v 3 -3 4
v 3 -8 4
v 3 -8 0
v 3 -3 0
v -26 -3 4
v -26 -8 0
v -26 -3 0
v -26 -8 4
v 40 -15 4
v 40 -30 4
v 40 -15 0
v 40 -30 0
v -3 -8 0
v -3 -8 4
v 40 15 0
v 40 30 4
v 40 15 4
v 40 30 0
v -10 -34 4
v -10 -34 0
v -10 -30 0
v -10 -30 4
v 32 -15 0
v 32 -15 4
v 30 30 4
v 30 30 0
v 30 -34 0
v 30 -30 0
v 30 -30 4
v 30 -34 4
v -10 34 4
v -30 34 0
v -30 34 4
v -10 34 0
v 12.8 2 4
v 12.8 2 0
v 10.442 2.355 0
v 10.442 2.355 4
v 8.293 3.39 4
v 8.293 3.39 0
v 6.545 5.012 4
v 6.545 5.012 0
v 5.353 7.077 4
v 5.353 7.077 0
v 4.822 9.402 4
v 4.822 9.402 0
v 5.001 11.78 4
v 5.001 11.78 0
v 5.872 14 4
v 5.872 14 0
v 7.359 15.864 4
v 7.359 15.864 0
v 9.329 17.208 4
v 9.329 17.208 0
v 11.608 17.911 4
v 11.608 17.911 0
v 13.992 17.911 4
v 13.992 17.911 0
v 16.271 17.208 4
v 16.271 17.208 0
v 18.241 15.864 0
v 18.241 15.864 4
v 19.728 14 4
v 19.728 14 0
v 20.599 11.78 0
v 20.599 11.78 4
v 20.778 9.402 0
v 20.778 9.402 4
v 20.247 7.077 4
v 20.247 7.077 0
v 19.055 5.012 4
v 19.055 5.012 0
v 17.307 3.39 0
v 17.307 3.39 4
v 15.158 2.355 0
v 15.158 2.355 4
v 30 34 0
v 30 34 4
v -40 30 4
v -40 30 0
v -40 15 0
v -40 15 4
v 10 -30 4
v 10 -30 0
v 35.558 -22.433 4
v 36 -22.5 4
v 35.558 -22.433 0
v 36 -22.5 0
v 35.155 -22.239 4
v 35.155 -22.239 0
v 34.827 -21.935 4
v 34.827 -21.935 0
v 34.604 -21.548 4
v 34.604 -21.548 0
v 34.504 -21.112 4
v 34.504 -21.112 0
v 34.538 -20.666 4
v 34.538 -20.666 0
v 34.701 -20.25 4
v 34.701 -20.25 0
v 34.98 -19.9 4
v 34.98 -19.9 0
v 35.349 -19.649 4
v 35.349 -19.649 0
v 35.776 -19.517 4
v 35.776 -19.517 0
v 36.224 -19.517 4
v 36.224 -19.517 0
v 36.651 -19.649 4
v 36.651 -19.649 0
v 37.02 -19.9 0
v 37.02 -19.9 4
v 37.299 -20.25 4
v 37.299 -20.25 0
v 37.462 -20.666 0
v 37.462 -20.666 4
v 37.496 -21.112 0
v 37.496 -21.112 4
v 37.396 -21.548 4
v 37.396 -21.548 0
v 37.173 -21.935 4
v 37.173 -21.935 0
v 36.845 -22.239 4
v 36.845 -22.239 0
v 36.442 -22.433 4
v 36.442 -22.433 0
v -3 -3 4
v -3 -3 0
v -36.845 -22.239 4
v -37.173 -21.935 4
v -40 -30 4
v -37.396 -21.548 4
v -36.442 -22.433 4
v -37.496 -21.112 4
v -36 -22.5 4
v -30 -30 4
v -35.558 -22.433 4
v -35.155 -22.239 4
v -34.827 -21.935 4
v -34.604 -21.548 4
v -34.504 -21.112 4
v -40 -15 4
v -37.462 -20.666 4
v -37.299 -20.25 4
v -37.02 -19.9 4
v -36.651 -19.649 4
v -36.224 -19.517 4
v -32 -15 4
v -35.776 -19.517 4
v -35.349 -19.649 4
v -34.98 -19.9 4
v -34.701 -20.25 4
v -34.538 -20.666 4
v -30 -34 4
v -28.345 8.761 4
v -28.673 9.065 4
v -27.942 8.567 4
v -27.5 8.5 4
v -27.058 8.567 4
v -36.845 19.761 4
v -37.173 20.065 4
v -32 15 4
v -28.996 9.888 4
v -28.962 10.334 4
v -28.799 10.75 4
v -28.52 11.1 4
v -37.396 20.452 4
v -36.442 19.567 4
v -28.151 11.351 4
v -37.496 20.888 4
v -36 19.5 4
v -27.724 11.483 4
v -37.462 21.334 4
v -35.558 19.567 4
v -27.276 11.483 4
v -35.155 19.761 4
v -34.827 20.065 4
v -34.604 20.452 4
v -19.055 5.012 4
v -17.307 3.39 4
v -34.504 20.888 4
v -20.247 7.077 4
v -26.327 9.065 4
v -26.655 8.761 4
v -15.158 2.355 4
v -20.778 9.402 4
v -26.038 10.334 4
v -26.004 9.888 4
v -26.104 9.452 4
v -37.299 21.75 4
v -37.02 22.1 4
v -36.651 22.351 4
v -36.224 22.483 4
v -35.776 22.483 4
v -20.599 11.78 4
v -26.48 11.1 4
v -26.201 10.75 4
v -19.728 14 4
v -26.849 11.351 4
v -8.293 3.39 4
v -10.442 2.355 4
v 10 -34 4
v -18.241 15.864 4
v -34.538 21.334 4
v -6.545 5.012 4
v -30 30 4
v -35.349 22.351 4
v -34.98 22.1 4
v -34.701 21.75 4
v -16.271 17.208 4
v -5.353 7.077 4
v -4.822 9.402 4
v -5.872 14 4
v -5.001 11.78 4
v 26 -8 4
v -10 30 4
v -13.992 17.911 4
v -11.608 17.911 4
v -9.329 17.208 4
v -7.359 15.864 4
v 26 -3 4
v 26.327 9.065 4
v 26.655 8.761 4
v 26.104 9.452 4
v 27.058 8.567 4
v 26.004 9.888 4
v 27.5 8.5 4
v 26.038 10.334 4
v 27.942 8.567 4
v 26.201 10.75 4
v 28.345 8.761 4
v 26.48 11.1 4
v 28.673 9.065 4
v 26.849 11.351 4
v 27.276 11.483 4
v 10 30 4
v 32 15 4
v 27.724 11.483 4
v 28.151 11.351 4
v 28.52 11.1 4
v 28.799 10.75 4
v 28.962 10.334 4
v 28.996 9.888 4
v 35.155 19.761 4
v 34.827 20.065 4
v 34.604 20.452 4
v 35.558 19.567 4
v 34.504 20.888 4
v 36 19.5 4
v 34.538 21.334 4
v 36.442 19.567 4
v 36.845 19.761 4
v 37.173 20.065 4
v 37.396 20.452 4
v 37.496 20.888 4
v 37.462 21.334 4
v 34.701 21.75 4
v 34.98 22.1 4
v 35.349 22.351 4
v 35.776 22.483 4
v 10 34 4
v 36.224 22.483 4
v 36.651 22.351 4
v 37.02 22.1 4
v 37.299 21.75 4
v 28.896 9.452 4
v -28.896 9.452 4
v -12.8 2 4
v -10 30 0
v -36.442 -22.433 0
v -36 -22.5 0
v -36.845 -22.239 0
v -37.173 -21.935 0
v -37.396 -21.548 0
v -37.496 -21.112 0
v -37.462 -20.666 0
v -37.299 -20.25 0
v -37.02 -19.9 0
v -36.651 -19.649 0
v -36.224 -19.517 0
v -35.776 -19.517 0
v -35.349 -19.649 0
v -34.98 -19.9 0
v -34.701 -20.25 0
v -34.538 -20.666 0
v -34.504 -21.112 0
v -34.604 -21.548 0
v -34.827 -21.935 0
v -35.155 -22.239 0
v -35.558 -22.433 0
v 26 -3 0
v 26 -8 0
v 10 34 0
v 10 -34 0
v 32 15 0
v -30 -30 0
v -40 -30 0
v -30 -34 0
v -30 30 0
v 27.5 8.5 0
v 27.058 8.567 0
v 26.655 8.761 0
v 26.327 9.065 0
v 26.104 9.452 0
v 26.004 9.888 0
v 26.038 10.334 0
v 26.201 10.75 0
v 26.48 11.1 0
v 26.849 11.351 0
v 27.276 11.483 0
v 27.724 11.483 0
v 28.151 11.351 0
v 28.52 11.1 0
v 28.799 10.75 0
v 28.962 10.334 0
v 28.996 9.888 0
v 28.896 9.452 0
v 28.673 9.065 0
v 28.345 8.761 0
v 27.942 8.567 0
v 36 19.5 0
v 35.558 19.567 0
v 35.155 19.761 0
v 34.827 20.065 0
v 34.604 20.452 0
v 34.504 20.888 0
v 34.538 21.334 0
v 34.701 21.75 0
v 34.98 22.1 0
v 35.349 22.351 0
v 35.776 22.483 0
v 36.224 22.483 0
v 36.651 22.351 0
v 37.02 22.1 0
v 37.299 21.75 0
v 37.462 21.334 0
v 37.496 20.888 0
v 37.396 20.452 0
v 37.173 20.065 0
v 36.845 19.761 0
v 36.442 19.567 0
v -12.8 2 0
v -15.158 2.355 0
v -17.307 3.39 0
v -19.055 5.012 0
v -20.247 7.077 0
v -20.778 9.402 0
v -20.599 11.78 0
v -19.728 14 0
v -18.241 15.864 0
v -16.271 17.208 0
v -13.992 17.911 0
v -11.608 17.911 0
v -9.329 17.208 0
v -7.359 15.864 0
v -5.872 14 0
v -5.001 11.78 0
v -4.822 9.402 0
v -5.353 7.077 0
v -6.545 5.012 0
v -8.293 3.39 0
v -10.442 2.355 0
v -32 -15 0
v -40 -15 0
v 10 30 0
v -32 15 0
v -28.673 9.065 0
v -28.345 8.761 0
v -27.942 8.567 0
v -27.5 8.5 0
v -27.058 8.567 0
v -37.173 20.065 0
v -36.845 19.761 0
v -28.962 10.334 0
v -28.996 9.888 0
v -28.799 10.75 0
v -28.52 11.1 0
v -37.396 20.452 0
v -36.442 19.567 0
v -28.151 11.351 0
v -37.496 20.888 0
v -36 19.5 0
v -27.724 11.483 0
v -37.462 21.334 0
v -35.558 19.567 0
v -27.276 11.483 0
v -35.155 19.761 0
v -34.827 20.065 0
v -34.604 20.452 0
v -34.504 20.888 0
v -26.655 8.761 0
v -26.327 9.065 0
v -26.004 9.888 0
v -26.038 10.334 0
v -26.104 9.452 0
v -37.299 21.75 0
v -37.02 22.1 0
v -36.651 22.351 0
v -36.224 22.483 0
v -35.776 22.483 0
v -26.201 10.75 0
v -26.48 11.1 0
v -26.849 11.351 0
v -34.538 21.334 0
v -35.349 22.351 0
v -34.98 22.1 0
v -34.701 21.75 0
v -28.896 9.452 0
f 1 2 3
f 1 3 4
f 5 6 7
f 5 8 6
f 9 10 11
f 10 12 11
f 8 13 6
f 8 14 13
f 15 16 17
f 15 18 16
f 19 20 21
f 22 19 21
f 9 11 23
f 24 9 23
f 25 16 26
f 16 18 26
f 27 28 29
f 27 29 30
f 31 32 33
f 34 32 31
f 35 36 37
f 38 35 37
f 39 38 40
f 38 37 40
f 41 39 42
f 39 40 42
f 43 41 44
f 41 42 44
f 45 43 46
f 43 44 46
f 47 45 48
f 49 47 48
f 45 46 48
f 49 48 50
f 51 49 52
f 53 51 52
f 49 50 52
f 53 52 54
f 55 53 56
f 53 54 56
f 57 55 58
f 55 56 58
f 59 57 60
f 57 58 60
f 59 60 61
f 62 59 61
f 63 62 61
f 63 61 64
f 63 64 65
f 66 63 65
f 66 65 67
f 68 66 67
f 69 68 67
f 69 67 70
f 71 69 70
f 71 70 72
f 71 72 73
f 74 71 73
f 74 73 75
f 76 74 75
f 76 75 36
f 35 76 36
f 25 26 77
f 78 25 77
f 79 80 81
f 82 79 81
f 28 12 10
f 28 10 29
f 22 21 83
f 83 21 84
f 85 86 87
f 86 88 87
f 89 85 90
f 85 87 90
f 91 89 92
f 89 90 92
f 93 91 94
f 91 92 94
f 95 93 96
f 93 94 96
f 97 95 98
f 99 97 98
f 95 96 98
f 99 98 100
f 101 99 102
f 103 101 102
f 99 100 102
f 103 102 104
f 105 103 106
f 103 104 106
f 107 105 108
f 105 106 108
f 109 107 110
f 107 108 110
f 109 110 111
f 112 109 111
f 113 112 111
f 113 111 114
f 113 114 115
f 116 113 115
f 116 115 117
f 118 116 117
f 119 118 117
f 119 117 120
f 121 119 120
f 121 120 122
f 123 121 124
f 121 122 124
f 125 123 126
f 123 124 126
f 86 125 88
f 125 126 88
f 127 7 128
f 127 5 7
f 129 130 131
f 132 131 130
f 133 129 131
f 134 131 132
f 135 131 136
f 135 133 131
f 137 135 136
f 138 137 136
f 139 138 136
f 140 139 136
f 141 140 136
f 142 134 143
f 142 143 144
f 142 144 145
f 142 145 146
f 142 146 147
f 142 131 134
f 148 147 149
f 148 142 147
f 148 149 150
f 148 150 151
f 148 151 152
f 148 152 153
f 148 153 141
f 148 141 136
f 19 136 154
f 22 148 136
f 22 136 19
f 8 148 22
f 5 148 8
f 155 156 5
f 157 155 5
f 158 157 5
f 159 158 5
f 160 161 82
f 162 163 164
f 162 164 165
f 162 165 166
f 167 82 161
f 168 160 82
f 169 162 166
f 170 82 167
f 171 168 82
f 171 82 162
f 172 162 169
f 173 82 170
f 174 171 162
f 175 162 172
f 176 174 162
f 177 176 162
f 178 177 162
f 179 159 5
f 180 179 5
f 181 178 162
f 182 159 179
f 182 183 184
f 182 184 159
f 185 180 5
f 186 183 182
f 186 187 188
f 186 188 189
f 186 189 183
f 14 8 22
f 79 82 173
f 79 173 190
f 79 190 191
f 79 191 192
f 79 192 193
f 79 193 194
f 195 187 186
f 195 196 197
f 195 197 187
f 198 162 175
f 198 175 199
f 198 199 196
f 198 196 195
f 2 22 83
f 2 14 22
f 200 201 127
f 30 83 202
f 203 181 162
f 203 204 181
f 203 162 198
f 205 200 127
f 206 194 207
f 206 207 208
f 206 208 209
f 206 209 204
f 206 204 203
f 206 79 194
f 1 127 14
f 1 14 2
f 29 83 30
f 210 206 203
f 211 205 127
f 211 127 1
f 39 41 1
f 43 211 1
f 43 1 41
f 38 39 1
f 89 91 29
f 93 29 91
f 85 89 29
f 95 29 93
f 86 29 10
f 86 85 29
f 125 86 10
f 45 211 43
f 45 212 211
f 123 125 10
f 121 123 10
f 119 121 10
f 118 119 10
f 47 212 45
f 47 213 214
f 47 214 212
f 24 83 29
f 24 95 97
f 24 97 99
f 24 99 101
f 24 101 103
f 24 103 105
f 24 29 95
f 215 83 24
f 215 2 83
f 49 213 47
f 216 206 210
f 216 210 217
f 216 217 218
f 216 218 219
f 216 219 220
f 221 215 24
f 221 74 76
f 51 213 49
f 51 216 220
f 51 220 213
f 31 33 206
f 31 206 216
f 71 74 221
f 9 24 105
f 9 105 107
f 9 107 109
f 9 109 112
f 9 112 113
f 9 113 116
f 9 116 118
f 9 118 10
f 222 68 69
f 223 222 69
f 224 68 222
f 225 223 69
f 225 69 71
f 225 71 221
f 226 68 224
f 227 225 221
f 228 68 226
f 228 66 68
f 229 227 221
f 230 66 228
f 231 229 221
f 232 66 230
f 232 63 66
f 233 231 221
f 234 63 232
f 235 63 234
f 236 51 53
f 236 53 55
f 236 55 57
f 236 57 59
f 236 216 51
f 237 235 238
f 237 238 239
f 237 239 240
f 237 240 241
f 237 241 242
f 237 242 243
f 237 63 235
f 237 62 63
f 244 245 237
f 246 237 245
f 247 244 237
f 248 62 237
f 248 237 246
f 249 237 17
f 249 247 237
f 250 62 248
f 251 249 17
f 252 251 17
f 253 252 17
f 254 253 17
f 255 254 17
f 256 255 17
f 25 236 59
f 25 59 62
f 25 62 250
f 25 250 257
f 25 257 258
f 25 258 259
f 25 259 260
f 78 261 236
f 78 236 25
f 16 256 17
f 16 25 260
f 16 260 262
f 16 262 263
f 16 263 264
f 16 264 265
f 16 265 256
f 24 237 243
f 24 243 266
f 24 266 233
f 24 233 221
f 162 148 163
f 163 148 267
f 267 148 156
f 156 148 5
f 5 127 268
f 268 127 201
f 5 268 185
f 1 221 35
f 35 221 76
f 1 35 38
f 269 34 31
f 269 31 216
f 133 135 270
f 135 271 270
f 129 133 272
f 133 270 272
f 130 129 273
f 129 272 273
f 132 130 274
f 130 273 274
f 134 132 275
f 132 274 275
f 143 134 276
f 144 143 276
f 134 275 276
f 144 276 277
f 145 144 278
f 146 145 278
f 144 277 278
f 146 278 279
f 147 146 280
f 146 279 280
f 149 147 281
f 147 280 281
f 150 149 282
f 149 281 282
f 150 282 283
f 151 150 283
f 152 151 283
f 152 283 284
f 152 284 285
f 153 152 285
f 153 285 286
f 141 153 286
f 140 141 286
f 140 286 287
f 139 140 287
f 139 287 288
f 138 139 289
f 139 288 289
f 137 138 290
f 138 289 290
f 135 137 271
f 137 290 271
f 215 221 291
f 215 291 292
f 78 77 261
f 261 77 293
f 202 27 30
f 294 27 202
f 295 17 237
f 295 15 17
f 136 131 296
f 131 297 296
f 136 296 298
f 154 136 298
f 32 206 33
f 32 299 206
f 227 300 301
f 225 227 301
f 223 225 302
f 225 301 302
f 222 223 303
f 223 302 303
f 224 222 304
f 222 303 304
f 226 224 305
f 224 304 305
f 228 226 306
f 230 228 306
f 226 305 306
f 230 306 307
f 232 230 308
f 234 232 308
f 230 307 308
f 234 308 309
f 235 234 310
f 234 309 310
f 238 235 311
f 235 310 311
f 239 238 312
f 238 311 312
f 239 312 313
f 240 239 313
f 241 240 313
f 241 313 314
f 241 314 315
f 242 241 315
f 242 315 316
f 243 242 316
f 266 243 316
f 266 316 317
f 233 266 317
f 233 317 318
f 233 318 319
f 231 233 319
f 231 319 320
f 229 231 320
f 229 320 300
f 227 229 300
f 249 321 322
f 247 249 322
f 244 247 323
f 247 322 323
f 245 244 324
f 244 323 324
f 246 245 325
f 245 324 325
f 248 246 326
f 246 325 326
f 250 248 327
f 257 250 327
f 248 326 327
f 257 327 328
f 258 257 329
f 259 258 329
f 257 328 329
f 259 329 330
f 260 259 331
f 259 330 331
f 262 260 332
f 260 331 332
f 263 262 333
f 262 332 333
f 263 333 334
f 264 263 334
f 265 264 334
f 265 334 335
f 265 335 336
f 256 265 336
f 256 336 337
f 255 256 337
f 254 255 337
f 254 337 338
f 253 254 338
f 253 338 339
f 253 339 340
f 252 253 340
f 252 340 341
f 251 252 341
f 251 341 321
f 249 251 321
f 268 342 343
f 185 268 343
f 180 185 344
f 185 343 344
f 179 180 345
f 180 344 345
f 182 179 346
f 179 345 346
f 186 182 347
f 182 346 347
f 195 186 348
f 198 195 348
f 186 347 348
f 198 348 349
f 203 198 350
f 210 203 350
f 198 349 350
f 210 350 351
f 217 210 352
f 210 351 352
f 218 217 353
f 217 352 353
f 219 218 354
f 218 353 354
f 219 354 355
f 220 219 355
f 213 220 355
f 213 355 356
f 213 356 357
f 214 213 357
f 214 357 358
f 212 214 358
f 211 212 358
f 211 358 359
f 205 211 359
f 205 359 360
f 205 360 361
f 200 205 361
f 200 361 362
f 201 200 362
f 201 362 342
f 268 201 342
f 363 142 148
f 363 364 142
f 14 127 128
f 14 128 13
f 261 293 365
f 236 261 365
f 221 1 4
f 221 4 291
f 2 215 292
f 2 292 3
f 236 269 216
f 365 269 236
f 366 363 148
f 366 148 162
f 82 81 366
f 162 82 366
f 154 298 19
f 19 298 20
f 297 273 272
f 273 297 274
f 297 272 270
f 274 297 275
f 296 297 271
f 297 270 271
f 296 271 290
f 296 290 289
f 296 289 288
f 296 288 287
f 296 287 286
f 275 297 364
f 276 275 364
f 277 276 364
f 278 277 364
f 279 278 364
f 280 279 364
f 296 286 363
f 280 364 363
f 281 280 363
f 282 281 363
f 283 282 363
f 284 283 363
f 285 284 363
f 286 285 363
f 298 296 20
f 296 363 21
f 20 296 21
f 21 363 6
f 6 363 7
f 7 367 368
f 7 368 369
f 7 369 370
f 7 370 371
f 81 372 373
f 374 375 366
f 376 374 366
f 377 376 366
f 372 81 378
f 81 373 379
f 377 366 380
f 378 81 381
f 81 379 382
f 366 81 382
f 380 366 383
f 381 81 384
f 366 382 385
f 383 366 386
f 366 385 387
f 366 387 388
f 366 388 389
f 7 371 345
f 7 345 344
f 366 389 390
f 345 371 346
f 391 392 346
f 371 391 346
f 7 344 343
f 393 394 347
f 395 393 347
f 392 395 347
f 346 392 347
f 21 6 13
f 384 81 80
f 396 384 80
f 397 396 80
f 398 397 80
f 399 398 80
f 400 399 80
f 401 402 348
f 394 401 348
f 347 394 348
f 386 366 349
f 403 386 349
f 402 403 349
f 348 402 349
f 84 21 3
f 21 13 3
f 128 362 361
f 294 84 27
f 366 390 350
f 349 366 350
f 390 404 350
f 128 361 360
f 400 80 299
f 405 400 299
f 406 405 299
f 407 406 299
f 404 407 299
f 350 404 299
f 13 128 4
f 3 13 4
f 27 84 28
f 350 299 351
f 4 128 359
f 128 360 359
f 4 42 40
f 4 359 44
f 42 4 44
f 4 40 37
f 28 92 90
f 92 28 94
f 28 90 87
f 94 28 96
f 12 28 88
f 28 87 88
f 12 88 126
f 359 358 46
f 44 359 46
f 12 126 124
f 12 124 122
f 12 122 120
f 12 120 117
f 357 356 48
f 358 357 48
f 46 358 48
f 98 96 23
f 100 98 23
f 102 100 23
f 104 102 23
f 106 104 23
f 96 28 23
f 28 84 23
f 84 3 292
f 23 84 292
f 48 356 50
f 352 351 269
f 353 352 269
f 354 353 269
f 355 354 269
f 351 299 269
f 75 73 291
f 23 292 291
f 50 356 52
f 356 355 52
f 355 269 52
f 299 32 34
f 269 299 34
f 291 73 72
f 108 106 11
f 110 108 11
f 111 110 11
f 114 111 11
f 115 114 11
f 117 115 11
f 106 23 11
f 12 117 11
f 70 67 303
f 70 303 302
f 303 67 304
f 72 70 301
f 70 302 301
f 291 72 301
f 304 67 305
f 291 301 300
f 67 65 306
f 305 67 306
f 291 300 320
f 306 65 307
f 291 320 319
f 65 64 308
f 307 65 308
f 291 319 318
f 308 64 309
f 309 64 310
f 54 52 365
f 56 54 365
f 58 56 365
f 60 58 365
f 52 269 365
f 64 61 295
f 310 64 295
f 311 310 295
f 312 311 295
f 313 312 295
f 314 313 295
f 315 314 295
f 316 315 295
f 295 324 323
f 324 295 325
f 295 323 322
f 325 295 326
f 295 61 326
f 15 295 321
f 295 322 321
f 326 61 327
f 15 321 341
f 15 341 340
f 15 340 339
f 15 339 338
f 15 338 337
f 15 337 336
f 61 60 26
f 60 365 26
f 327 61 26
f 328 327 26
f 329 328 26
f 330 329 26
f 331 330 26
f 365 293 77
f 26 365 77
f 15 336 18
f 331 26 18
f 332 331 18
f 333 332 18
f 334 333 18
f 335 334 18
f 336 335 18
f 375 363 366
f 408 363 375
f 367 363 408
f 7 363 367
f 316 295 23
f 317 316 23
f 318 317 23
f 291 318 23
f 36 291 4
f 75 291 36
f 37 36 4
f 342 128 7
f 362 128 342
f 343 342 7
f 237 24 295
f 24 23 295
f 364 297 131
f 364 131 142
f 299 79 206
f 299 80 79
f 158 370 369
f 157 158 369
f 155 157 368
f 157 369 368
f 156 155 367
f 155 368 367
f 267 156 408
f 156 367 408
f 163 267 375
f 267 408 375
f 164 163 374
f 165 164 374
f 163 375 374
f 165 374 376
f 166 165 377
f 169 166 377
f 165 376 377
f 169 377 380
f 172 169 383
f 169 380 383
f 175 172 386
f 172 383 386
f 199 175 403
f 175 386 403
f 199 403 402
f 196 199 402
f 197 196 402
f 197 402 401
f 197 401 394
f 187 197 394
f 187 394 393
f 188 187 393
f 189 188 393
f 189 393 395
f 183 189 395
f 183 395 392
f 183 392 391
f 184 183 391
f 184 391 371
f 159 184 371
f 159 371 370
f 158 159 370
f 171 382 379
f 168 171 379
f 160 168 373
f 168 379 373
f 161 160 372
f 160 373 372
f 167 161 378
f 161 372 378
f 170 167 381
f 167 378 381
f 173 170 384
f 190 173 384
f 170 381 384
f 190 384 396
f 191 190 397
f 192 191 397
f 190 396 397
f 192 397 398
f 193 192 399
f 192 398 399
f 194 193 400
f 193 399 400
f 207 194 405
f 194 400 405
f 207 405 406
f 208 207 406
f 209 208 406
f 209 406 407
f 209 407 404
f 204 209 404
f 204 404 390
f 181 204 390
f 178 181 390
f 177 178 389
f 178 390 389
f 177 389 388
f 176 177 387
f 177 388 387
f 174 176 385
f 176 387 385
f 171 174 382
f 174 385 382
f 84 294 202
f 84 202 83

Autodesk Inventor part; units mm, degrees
ref_plane "YZ Plane" through (0, 0, 0) normal (1, 0, 0) x (0, 1, 0)
ref_plane "XZ Plane" through (0, 0, 0) normal (0, 1, 0) x (-1, 0, 0)
ref_plane "XY Plane" through (0, 0, 0) normal (0, 0, 1) x (1, 0, 0)
sketch "Эскиз1" plane through (0, 0, 0) normal (0, 0, 1) x (1, 0, 0)
  line L0 (0, 0) -> (-40, 0)
  line L1 (-40, -30) -> (-30, -30)
  line L2 (-30, -30) -> (-30, -34)
  line L3 (-30, -34) -> (-10, -34)
  line L4 (-10, -34) -> (-10, -30)
  line L5 (-10, -30) -> (0, -30)
  line L6 (-40, -30) -> (-40, -15)
  line L7 (-40, -15) -> (-32, -15)
  line L8 (-32, -15) -> (-32, 0)
  line L9 (-40, 30) -> (-30, 30)
  line L10 (-30, 30) -> (-30, 34)
  line L11 (-30, 34) -> (-10, 34)
  line L12 (-10, 34) -> (-10, 30)
  line L13 (-10, 30) -> (0, 30)
  line L14 (-40, 30) -> (-40, 15)
  line L15 (-40, 15) -> (-32, 15)
  line L16 (-32, 15) -> (-32, 0)
  line L17 (0, 30) -> (0, -30)
  line L18 (0, 0) -> (40, 0)
  line L19 (40, -30) -> (30, -30)
  line L20 (30, -30) -> (30, -34)
  line L21 (30, -34) -> (10, -34)
  line L22 (10, -34) -> (10, -30)
  line L23 (10, -30) -> (0, -30)
  line L24 (40, -30) -> (40, -15)
  line L25 (40, -15) -> (32, -15)
  line L26 (32, -15) -> (32, 0)
  line L27 (40, 30) -> (30, 30)
  line L28 (30, 30) -> (30, 34)
  line L29 (30, 34) -> (10, 34)
  line L30 (10, 34) -> (10, 30)
  line L31 (10, 30) -> (0, 30)
  line L32 (40, 30) -> (40, 15)
  line L33 (40, 15) -> (32, 15)
  line L34 (32, 15) -> (32, 0)
  dimension "d0" = 4
  dimension "d1" = 60
  dimension "d3" = 20
  dimension "d6" = 15
  dimension "d8" = 15
  dimension "d9" = 10
  dimension "d11" = 20
  dimension "d14" = 8
extrude "Выдавливание1" add sketch "Эскиз1" along normal blind 4
sketch "Эскиз2" plane through (0, 0, 4) normal (0, 0, 1) x (1, 0, 0)
  line L0 (10, 30) -> (-10, 30) projected
  line L1 (0, 30) -> (0, -30)
  line L2 (-10, -30) -> (10, -30) projected
  line L3 (-32, 15) -> (-32, -15) projected
  line L4 (-32, 0) -> (32, 0)
  line L5 (32, -15) -> (32, 15) projected
  line L6 (-40, 15) -> (-32, 15) projected
  line L7 (-30, 30) -> (-40, 30) projected
  line L8 (-40, 30) -> (-40, 15) projected
  point P0 (0, 0)
  point P1 (-36, -21)
  point P2 (36, -21)
  point P3 (-36, 21)
  point P4 (36, 21)
  point P5 (-36, 15)
  point P6 (-40, 22.5)
  dimension "d23" = 9
hole "Отверстие1" at (-36, -21, 4) at (36, -21, 4) at (-36, 21, 4) at (36, 21, 4) direction (0, 0, -1) diameter 3 end through all
sketch "Эскиз3" plane through (0, 0, 4) normal (0, 0, 1) x (1, 0, 0)
  line L0 (0, 0) -> (0, 30)
  line L1 (10, 30) -> (-10, 30) projected
  point P0 (-12.8, 10)
  point P1 (12.8, 10)
  dimension "d31" = 25.6
  dimension "d32" = 10
hole "Отверстие2" at (-12.8, 10, 4) at (12.8, 10, 4) direction (0, 0, -1) diameter 16 end through all
sketch "Эскиз4" plane through (0, 0, 4) normal (0, 0, 1) x (1, 0, 0)
  circle A0 centre (-12.8, 10) radius 8 projected
  line L0 (-10, -30) -> (10, -30) projected
  line L1 (0, -30) -> (0, 30)
  line L2 (10, 30) -> (-10, 30) projected
  point P0 (0, 0)
  point P1 (-27.5, 10)
  point P2 (27.5, 10)
  dimension "d40" = 55
hole "Отверстие3" at (-27.5, 10, 4) at (27.5, 10, 4) direction (0, 0, -1) diameter 3 end through all
sketch "Эскиз5" plane through (0, 0, 4) normal (0, 0, 1) x (1, 0, 0)
  line L0 (-26, -3) -> (-3, -3)
  line L1 (-3, -3) -> (-3, -8)
  line L2 (-3, -8) -> (-26, -8)
  line L3 (-26, -8) -> (-26, -3)
  line L4 (3, -3) -> (26, -3)
  line L5 (26, -3) -> (26, -8)
  line L6 (26, -8) -> (3, -8)
  line L7 (3, -8) -> (3, -3)
  line L8 (-10, -30) -> (10, -30) projected
  line L9 (0, -30) -> (0, 30)
  line L10 (10, 30) -> (-10, 30) projected
  line L11 (32, -15) -> (32, 15) projected
  point P0 (0, 0)
  point P1 (3, -5.5)
  point P2 (-3, -5.5)
  dimension "d42" = 23
  dimension "d43" = 22
  dimension "d44" = 5
  dimension "d45" = 6
extrude "Выдавливание2" cut sketch "Эскиз5" against normal through all
properties part number "top" material "Дерево (береза)"
